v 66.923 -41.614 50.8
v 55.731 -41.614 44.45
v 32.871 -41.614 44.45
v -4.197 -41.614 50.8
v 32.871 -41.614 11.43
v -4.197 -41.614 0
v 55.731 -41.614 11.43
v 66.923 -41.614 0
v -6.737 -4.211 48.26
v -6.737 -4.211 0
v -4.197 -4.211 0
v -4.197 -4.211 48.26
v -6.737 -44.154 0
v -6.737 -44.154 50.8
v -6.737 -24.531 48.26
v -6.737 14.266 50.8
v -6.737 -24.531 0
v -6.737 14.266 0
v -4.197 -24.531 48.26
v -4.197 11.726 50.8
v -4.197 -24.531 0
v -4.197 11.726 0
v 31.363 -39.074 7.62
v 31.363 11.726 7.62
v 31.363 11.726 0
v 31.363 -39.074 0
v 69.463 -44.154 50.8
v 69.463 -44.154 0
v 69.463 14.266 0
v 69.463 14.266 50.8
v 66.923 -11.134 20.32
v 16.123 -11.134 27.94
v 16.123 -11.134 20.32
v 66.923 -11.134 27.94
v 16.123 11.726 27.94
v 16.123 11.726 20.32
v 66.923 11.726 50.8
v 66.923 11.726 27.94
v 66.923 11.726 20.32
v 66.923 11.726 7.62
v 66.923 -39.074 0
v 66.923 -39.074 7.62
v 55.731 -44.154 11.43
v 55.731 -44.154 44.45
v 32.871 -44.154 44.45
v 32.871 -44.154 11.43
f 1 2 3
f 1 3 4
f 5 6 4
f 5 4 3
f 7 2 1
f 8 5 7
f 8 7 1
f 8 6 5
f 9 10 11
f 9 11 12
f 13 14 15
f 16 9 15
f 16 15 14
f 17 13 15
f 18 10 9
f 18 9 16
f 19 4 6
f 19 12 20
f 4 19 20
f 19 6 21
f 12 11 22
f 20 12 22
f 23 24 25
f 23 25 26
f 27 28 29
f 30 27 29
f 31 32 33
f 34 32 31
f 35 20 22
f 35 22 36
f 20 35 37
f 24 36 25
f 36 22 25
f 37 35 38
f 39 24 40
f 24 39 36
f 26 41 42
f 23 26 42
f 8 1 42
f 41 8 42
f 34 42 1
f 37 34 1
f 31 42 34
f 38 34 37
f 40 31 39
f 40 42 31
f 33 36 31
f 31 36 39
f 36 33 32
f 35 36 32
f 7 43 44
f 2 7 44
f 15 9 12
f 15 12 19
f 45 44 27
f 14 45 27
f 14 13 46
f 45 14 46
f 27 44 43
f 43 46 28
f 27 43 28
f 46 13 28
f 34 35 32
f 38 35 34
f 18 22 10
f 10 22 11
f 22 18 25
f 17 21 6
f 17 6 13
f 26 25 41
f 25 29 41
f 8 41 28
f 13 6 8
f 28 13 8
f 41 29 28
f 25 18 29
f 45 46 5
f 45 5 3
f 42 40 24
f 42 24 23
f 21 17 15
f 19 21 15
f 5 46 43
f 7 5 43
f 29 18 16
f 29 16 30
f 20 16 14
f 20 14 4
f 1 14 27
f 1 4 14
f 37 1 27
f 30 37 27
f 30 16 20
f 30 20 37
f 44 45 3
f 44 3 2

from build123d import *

# Parameters (mm, degrees)
F0_W     = 76.2
F0_H     = 58.42
F0_W_2   = 71.12
F0_H_2   = 53.34
F1_DEPTH = 50.8
F2_W     = 50.8
F2_H     = 7.62
F6_DEPTH = 22.86
F7_W     = 50.8
F7_H     = 7.62
F8_DEPTH = 35.56
F3_W     = 20.32
F3_H     = 48.26
F9_DEPTH = 2.54
F4_W     = 22.86
F4_H     = 33.02
F5_DEPTH = 2.54


with BuildPart() as f1:
    # F0 (on Top) → F1 (new body)
    with BuildSketch(Plane.XY):
        with Locations((31.363072, -14.94423)):
            Rectangle(F0_W, F0_H)
        with Locations((31.363072, -14.94423)):
            Rectangle(F0_W_2, F0_H_2, mode=Mode.SUBTRACT)
    extrude(amount=F1_DEPTH)

    # F2 (on face) → F6 (join)
    with BuildSketch(Plane.XZ.offset(-11.72577)):
        with Locations((41.523072, 24.13)):
            Rectangle(F2_W, F2_H)
    extrude(amount=F6_DEPTH)

    # F7 (on face) → F8 (join)
    with BuildSketch(Plane(origin=(66.923072, 0, 0), x_dir=(0, -1, 0), z_dir=(-1, 0, 0))):
        with Locations((13.67423, 3.81)):
            Rectangle(F7_W, F7_H)
    extrude(amount=F8_DEPTH)

    # F3 (on face) → F9 (cut, through all)
    with BuildSketch(Plane(origin=(-6.736928, 0, 0), x_dir=(0, -1, 0), z_dir=(-1, 0, 0))):
        with Locations((14.370841, 24.13)):
            Rectangle(F3_W, F3_H)
    extrude(amount=-F9_DEPTH, mode=Mode.SUBTRACT)

    # F4 (on face) → F5 (cut, through all)
    with BuildSketch(Plane.XZ.offset(44.15423)):
        with Locations((44.301499, 27.94)):
            Rectangle(F4_W, F4_H)
    extrude(amount=-F5_DEPTH, mode=Mode.SUBTRACT)


solid = f1.part
